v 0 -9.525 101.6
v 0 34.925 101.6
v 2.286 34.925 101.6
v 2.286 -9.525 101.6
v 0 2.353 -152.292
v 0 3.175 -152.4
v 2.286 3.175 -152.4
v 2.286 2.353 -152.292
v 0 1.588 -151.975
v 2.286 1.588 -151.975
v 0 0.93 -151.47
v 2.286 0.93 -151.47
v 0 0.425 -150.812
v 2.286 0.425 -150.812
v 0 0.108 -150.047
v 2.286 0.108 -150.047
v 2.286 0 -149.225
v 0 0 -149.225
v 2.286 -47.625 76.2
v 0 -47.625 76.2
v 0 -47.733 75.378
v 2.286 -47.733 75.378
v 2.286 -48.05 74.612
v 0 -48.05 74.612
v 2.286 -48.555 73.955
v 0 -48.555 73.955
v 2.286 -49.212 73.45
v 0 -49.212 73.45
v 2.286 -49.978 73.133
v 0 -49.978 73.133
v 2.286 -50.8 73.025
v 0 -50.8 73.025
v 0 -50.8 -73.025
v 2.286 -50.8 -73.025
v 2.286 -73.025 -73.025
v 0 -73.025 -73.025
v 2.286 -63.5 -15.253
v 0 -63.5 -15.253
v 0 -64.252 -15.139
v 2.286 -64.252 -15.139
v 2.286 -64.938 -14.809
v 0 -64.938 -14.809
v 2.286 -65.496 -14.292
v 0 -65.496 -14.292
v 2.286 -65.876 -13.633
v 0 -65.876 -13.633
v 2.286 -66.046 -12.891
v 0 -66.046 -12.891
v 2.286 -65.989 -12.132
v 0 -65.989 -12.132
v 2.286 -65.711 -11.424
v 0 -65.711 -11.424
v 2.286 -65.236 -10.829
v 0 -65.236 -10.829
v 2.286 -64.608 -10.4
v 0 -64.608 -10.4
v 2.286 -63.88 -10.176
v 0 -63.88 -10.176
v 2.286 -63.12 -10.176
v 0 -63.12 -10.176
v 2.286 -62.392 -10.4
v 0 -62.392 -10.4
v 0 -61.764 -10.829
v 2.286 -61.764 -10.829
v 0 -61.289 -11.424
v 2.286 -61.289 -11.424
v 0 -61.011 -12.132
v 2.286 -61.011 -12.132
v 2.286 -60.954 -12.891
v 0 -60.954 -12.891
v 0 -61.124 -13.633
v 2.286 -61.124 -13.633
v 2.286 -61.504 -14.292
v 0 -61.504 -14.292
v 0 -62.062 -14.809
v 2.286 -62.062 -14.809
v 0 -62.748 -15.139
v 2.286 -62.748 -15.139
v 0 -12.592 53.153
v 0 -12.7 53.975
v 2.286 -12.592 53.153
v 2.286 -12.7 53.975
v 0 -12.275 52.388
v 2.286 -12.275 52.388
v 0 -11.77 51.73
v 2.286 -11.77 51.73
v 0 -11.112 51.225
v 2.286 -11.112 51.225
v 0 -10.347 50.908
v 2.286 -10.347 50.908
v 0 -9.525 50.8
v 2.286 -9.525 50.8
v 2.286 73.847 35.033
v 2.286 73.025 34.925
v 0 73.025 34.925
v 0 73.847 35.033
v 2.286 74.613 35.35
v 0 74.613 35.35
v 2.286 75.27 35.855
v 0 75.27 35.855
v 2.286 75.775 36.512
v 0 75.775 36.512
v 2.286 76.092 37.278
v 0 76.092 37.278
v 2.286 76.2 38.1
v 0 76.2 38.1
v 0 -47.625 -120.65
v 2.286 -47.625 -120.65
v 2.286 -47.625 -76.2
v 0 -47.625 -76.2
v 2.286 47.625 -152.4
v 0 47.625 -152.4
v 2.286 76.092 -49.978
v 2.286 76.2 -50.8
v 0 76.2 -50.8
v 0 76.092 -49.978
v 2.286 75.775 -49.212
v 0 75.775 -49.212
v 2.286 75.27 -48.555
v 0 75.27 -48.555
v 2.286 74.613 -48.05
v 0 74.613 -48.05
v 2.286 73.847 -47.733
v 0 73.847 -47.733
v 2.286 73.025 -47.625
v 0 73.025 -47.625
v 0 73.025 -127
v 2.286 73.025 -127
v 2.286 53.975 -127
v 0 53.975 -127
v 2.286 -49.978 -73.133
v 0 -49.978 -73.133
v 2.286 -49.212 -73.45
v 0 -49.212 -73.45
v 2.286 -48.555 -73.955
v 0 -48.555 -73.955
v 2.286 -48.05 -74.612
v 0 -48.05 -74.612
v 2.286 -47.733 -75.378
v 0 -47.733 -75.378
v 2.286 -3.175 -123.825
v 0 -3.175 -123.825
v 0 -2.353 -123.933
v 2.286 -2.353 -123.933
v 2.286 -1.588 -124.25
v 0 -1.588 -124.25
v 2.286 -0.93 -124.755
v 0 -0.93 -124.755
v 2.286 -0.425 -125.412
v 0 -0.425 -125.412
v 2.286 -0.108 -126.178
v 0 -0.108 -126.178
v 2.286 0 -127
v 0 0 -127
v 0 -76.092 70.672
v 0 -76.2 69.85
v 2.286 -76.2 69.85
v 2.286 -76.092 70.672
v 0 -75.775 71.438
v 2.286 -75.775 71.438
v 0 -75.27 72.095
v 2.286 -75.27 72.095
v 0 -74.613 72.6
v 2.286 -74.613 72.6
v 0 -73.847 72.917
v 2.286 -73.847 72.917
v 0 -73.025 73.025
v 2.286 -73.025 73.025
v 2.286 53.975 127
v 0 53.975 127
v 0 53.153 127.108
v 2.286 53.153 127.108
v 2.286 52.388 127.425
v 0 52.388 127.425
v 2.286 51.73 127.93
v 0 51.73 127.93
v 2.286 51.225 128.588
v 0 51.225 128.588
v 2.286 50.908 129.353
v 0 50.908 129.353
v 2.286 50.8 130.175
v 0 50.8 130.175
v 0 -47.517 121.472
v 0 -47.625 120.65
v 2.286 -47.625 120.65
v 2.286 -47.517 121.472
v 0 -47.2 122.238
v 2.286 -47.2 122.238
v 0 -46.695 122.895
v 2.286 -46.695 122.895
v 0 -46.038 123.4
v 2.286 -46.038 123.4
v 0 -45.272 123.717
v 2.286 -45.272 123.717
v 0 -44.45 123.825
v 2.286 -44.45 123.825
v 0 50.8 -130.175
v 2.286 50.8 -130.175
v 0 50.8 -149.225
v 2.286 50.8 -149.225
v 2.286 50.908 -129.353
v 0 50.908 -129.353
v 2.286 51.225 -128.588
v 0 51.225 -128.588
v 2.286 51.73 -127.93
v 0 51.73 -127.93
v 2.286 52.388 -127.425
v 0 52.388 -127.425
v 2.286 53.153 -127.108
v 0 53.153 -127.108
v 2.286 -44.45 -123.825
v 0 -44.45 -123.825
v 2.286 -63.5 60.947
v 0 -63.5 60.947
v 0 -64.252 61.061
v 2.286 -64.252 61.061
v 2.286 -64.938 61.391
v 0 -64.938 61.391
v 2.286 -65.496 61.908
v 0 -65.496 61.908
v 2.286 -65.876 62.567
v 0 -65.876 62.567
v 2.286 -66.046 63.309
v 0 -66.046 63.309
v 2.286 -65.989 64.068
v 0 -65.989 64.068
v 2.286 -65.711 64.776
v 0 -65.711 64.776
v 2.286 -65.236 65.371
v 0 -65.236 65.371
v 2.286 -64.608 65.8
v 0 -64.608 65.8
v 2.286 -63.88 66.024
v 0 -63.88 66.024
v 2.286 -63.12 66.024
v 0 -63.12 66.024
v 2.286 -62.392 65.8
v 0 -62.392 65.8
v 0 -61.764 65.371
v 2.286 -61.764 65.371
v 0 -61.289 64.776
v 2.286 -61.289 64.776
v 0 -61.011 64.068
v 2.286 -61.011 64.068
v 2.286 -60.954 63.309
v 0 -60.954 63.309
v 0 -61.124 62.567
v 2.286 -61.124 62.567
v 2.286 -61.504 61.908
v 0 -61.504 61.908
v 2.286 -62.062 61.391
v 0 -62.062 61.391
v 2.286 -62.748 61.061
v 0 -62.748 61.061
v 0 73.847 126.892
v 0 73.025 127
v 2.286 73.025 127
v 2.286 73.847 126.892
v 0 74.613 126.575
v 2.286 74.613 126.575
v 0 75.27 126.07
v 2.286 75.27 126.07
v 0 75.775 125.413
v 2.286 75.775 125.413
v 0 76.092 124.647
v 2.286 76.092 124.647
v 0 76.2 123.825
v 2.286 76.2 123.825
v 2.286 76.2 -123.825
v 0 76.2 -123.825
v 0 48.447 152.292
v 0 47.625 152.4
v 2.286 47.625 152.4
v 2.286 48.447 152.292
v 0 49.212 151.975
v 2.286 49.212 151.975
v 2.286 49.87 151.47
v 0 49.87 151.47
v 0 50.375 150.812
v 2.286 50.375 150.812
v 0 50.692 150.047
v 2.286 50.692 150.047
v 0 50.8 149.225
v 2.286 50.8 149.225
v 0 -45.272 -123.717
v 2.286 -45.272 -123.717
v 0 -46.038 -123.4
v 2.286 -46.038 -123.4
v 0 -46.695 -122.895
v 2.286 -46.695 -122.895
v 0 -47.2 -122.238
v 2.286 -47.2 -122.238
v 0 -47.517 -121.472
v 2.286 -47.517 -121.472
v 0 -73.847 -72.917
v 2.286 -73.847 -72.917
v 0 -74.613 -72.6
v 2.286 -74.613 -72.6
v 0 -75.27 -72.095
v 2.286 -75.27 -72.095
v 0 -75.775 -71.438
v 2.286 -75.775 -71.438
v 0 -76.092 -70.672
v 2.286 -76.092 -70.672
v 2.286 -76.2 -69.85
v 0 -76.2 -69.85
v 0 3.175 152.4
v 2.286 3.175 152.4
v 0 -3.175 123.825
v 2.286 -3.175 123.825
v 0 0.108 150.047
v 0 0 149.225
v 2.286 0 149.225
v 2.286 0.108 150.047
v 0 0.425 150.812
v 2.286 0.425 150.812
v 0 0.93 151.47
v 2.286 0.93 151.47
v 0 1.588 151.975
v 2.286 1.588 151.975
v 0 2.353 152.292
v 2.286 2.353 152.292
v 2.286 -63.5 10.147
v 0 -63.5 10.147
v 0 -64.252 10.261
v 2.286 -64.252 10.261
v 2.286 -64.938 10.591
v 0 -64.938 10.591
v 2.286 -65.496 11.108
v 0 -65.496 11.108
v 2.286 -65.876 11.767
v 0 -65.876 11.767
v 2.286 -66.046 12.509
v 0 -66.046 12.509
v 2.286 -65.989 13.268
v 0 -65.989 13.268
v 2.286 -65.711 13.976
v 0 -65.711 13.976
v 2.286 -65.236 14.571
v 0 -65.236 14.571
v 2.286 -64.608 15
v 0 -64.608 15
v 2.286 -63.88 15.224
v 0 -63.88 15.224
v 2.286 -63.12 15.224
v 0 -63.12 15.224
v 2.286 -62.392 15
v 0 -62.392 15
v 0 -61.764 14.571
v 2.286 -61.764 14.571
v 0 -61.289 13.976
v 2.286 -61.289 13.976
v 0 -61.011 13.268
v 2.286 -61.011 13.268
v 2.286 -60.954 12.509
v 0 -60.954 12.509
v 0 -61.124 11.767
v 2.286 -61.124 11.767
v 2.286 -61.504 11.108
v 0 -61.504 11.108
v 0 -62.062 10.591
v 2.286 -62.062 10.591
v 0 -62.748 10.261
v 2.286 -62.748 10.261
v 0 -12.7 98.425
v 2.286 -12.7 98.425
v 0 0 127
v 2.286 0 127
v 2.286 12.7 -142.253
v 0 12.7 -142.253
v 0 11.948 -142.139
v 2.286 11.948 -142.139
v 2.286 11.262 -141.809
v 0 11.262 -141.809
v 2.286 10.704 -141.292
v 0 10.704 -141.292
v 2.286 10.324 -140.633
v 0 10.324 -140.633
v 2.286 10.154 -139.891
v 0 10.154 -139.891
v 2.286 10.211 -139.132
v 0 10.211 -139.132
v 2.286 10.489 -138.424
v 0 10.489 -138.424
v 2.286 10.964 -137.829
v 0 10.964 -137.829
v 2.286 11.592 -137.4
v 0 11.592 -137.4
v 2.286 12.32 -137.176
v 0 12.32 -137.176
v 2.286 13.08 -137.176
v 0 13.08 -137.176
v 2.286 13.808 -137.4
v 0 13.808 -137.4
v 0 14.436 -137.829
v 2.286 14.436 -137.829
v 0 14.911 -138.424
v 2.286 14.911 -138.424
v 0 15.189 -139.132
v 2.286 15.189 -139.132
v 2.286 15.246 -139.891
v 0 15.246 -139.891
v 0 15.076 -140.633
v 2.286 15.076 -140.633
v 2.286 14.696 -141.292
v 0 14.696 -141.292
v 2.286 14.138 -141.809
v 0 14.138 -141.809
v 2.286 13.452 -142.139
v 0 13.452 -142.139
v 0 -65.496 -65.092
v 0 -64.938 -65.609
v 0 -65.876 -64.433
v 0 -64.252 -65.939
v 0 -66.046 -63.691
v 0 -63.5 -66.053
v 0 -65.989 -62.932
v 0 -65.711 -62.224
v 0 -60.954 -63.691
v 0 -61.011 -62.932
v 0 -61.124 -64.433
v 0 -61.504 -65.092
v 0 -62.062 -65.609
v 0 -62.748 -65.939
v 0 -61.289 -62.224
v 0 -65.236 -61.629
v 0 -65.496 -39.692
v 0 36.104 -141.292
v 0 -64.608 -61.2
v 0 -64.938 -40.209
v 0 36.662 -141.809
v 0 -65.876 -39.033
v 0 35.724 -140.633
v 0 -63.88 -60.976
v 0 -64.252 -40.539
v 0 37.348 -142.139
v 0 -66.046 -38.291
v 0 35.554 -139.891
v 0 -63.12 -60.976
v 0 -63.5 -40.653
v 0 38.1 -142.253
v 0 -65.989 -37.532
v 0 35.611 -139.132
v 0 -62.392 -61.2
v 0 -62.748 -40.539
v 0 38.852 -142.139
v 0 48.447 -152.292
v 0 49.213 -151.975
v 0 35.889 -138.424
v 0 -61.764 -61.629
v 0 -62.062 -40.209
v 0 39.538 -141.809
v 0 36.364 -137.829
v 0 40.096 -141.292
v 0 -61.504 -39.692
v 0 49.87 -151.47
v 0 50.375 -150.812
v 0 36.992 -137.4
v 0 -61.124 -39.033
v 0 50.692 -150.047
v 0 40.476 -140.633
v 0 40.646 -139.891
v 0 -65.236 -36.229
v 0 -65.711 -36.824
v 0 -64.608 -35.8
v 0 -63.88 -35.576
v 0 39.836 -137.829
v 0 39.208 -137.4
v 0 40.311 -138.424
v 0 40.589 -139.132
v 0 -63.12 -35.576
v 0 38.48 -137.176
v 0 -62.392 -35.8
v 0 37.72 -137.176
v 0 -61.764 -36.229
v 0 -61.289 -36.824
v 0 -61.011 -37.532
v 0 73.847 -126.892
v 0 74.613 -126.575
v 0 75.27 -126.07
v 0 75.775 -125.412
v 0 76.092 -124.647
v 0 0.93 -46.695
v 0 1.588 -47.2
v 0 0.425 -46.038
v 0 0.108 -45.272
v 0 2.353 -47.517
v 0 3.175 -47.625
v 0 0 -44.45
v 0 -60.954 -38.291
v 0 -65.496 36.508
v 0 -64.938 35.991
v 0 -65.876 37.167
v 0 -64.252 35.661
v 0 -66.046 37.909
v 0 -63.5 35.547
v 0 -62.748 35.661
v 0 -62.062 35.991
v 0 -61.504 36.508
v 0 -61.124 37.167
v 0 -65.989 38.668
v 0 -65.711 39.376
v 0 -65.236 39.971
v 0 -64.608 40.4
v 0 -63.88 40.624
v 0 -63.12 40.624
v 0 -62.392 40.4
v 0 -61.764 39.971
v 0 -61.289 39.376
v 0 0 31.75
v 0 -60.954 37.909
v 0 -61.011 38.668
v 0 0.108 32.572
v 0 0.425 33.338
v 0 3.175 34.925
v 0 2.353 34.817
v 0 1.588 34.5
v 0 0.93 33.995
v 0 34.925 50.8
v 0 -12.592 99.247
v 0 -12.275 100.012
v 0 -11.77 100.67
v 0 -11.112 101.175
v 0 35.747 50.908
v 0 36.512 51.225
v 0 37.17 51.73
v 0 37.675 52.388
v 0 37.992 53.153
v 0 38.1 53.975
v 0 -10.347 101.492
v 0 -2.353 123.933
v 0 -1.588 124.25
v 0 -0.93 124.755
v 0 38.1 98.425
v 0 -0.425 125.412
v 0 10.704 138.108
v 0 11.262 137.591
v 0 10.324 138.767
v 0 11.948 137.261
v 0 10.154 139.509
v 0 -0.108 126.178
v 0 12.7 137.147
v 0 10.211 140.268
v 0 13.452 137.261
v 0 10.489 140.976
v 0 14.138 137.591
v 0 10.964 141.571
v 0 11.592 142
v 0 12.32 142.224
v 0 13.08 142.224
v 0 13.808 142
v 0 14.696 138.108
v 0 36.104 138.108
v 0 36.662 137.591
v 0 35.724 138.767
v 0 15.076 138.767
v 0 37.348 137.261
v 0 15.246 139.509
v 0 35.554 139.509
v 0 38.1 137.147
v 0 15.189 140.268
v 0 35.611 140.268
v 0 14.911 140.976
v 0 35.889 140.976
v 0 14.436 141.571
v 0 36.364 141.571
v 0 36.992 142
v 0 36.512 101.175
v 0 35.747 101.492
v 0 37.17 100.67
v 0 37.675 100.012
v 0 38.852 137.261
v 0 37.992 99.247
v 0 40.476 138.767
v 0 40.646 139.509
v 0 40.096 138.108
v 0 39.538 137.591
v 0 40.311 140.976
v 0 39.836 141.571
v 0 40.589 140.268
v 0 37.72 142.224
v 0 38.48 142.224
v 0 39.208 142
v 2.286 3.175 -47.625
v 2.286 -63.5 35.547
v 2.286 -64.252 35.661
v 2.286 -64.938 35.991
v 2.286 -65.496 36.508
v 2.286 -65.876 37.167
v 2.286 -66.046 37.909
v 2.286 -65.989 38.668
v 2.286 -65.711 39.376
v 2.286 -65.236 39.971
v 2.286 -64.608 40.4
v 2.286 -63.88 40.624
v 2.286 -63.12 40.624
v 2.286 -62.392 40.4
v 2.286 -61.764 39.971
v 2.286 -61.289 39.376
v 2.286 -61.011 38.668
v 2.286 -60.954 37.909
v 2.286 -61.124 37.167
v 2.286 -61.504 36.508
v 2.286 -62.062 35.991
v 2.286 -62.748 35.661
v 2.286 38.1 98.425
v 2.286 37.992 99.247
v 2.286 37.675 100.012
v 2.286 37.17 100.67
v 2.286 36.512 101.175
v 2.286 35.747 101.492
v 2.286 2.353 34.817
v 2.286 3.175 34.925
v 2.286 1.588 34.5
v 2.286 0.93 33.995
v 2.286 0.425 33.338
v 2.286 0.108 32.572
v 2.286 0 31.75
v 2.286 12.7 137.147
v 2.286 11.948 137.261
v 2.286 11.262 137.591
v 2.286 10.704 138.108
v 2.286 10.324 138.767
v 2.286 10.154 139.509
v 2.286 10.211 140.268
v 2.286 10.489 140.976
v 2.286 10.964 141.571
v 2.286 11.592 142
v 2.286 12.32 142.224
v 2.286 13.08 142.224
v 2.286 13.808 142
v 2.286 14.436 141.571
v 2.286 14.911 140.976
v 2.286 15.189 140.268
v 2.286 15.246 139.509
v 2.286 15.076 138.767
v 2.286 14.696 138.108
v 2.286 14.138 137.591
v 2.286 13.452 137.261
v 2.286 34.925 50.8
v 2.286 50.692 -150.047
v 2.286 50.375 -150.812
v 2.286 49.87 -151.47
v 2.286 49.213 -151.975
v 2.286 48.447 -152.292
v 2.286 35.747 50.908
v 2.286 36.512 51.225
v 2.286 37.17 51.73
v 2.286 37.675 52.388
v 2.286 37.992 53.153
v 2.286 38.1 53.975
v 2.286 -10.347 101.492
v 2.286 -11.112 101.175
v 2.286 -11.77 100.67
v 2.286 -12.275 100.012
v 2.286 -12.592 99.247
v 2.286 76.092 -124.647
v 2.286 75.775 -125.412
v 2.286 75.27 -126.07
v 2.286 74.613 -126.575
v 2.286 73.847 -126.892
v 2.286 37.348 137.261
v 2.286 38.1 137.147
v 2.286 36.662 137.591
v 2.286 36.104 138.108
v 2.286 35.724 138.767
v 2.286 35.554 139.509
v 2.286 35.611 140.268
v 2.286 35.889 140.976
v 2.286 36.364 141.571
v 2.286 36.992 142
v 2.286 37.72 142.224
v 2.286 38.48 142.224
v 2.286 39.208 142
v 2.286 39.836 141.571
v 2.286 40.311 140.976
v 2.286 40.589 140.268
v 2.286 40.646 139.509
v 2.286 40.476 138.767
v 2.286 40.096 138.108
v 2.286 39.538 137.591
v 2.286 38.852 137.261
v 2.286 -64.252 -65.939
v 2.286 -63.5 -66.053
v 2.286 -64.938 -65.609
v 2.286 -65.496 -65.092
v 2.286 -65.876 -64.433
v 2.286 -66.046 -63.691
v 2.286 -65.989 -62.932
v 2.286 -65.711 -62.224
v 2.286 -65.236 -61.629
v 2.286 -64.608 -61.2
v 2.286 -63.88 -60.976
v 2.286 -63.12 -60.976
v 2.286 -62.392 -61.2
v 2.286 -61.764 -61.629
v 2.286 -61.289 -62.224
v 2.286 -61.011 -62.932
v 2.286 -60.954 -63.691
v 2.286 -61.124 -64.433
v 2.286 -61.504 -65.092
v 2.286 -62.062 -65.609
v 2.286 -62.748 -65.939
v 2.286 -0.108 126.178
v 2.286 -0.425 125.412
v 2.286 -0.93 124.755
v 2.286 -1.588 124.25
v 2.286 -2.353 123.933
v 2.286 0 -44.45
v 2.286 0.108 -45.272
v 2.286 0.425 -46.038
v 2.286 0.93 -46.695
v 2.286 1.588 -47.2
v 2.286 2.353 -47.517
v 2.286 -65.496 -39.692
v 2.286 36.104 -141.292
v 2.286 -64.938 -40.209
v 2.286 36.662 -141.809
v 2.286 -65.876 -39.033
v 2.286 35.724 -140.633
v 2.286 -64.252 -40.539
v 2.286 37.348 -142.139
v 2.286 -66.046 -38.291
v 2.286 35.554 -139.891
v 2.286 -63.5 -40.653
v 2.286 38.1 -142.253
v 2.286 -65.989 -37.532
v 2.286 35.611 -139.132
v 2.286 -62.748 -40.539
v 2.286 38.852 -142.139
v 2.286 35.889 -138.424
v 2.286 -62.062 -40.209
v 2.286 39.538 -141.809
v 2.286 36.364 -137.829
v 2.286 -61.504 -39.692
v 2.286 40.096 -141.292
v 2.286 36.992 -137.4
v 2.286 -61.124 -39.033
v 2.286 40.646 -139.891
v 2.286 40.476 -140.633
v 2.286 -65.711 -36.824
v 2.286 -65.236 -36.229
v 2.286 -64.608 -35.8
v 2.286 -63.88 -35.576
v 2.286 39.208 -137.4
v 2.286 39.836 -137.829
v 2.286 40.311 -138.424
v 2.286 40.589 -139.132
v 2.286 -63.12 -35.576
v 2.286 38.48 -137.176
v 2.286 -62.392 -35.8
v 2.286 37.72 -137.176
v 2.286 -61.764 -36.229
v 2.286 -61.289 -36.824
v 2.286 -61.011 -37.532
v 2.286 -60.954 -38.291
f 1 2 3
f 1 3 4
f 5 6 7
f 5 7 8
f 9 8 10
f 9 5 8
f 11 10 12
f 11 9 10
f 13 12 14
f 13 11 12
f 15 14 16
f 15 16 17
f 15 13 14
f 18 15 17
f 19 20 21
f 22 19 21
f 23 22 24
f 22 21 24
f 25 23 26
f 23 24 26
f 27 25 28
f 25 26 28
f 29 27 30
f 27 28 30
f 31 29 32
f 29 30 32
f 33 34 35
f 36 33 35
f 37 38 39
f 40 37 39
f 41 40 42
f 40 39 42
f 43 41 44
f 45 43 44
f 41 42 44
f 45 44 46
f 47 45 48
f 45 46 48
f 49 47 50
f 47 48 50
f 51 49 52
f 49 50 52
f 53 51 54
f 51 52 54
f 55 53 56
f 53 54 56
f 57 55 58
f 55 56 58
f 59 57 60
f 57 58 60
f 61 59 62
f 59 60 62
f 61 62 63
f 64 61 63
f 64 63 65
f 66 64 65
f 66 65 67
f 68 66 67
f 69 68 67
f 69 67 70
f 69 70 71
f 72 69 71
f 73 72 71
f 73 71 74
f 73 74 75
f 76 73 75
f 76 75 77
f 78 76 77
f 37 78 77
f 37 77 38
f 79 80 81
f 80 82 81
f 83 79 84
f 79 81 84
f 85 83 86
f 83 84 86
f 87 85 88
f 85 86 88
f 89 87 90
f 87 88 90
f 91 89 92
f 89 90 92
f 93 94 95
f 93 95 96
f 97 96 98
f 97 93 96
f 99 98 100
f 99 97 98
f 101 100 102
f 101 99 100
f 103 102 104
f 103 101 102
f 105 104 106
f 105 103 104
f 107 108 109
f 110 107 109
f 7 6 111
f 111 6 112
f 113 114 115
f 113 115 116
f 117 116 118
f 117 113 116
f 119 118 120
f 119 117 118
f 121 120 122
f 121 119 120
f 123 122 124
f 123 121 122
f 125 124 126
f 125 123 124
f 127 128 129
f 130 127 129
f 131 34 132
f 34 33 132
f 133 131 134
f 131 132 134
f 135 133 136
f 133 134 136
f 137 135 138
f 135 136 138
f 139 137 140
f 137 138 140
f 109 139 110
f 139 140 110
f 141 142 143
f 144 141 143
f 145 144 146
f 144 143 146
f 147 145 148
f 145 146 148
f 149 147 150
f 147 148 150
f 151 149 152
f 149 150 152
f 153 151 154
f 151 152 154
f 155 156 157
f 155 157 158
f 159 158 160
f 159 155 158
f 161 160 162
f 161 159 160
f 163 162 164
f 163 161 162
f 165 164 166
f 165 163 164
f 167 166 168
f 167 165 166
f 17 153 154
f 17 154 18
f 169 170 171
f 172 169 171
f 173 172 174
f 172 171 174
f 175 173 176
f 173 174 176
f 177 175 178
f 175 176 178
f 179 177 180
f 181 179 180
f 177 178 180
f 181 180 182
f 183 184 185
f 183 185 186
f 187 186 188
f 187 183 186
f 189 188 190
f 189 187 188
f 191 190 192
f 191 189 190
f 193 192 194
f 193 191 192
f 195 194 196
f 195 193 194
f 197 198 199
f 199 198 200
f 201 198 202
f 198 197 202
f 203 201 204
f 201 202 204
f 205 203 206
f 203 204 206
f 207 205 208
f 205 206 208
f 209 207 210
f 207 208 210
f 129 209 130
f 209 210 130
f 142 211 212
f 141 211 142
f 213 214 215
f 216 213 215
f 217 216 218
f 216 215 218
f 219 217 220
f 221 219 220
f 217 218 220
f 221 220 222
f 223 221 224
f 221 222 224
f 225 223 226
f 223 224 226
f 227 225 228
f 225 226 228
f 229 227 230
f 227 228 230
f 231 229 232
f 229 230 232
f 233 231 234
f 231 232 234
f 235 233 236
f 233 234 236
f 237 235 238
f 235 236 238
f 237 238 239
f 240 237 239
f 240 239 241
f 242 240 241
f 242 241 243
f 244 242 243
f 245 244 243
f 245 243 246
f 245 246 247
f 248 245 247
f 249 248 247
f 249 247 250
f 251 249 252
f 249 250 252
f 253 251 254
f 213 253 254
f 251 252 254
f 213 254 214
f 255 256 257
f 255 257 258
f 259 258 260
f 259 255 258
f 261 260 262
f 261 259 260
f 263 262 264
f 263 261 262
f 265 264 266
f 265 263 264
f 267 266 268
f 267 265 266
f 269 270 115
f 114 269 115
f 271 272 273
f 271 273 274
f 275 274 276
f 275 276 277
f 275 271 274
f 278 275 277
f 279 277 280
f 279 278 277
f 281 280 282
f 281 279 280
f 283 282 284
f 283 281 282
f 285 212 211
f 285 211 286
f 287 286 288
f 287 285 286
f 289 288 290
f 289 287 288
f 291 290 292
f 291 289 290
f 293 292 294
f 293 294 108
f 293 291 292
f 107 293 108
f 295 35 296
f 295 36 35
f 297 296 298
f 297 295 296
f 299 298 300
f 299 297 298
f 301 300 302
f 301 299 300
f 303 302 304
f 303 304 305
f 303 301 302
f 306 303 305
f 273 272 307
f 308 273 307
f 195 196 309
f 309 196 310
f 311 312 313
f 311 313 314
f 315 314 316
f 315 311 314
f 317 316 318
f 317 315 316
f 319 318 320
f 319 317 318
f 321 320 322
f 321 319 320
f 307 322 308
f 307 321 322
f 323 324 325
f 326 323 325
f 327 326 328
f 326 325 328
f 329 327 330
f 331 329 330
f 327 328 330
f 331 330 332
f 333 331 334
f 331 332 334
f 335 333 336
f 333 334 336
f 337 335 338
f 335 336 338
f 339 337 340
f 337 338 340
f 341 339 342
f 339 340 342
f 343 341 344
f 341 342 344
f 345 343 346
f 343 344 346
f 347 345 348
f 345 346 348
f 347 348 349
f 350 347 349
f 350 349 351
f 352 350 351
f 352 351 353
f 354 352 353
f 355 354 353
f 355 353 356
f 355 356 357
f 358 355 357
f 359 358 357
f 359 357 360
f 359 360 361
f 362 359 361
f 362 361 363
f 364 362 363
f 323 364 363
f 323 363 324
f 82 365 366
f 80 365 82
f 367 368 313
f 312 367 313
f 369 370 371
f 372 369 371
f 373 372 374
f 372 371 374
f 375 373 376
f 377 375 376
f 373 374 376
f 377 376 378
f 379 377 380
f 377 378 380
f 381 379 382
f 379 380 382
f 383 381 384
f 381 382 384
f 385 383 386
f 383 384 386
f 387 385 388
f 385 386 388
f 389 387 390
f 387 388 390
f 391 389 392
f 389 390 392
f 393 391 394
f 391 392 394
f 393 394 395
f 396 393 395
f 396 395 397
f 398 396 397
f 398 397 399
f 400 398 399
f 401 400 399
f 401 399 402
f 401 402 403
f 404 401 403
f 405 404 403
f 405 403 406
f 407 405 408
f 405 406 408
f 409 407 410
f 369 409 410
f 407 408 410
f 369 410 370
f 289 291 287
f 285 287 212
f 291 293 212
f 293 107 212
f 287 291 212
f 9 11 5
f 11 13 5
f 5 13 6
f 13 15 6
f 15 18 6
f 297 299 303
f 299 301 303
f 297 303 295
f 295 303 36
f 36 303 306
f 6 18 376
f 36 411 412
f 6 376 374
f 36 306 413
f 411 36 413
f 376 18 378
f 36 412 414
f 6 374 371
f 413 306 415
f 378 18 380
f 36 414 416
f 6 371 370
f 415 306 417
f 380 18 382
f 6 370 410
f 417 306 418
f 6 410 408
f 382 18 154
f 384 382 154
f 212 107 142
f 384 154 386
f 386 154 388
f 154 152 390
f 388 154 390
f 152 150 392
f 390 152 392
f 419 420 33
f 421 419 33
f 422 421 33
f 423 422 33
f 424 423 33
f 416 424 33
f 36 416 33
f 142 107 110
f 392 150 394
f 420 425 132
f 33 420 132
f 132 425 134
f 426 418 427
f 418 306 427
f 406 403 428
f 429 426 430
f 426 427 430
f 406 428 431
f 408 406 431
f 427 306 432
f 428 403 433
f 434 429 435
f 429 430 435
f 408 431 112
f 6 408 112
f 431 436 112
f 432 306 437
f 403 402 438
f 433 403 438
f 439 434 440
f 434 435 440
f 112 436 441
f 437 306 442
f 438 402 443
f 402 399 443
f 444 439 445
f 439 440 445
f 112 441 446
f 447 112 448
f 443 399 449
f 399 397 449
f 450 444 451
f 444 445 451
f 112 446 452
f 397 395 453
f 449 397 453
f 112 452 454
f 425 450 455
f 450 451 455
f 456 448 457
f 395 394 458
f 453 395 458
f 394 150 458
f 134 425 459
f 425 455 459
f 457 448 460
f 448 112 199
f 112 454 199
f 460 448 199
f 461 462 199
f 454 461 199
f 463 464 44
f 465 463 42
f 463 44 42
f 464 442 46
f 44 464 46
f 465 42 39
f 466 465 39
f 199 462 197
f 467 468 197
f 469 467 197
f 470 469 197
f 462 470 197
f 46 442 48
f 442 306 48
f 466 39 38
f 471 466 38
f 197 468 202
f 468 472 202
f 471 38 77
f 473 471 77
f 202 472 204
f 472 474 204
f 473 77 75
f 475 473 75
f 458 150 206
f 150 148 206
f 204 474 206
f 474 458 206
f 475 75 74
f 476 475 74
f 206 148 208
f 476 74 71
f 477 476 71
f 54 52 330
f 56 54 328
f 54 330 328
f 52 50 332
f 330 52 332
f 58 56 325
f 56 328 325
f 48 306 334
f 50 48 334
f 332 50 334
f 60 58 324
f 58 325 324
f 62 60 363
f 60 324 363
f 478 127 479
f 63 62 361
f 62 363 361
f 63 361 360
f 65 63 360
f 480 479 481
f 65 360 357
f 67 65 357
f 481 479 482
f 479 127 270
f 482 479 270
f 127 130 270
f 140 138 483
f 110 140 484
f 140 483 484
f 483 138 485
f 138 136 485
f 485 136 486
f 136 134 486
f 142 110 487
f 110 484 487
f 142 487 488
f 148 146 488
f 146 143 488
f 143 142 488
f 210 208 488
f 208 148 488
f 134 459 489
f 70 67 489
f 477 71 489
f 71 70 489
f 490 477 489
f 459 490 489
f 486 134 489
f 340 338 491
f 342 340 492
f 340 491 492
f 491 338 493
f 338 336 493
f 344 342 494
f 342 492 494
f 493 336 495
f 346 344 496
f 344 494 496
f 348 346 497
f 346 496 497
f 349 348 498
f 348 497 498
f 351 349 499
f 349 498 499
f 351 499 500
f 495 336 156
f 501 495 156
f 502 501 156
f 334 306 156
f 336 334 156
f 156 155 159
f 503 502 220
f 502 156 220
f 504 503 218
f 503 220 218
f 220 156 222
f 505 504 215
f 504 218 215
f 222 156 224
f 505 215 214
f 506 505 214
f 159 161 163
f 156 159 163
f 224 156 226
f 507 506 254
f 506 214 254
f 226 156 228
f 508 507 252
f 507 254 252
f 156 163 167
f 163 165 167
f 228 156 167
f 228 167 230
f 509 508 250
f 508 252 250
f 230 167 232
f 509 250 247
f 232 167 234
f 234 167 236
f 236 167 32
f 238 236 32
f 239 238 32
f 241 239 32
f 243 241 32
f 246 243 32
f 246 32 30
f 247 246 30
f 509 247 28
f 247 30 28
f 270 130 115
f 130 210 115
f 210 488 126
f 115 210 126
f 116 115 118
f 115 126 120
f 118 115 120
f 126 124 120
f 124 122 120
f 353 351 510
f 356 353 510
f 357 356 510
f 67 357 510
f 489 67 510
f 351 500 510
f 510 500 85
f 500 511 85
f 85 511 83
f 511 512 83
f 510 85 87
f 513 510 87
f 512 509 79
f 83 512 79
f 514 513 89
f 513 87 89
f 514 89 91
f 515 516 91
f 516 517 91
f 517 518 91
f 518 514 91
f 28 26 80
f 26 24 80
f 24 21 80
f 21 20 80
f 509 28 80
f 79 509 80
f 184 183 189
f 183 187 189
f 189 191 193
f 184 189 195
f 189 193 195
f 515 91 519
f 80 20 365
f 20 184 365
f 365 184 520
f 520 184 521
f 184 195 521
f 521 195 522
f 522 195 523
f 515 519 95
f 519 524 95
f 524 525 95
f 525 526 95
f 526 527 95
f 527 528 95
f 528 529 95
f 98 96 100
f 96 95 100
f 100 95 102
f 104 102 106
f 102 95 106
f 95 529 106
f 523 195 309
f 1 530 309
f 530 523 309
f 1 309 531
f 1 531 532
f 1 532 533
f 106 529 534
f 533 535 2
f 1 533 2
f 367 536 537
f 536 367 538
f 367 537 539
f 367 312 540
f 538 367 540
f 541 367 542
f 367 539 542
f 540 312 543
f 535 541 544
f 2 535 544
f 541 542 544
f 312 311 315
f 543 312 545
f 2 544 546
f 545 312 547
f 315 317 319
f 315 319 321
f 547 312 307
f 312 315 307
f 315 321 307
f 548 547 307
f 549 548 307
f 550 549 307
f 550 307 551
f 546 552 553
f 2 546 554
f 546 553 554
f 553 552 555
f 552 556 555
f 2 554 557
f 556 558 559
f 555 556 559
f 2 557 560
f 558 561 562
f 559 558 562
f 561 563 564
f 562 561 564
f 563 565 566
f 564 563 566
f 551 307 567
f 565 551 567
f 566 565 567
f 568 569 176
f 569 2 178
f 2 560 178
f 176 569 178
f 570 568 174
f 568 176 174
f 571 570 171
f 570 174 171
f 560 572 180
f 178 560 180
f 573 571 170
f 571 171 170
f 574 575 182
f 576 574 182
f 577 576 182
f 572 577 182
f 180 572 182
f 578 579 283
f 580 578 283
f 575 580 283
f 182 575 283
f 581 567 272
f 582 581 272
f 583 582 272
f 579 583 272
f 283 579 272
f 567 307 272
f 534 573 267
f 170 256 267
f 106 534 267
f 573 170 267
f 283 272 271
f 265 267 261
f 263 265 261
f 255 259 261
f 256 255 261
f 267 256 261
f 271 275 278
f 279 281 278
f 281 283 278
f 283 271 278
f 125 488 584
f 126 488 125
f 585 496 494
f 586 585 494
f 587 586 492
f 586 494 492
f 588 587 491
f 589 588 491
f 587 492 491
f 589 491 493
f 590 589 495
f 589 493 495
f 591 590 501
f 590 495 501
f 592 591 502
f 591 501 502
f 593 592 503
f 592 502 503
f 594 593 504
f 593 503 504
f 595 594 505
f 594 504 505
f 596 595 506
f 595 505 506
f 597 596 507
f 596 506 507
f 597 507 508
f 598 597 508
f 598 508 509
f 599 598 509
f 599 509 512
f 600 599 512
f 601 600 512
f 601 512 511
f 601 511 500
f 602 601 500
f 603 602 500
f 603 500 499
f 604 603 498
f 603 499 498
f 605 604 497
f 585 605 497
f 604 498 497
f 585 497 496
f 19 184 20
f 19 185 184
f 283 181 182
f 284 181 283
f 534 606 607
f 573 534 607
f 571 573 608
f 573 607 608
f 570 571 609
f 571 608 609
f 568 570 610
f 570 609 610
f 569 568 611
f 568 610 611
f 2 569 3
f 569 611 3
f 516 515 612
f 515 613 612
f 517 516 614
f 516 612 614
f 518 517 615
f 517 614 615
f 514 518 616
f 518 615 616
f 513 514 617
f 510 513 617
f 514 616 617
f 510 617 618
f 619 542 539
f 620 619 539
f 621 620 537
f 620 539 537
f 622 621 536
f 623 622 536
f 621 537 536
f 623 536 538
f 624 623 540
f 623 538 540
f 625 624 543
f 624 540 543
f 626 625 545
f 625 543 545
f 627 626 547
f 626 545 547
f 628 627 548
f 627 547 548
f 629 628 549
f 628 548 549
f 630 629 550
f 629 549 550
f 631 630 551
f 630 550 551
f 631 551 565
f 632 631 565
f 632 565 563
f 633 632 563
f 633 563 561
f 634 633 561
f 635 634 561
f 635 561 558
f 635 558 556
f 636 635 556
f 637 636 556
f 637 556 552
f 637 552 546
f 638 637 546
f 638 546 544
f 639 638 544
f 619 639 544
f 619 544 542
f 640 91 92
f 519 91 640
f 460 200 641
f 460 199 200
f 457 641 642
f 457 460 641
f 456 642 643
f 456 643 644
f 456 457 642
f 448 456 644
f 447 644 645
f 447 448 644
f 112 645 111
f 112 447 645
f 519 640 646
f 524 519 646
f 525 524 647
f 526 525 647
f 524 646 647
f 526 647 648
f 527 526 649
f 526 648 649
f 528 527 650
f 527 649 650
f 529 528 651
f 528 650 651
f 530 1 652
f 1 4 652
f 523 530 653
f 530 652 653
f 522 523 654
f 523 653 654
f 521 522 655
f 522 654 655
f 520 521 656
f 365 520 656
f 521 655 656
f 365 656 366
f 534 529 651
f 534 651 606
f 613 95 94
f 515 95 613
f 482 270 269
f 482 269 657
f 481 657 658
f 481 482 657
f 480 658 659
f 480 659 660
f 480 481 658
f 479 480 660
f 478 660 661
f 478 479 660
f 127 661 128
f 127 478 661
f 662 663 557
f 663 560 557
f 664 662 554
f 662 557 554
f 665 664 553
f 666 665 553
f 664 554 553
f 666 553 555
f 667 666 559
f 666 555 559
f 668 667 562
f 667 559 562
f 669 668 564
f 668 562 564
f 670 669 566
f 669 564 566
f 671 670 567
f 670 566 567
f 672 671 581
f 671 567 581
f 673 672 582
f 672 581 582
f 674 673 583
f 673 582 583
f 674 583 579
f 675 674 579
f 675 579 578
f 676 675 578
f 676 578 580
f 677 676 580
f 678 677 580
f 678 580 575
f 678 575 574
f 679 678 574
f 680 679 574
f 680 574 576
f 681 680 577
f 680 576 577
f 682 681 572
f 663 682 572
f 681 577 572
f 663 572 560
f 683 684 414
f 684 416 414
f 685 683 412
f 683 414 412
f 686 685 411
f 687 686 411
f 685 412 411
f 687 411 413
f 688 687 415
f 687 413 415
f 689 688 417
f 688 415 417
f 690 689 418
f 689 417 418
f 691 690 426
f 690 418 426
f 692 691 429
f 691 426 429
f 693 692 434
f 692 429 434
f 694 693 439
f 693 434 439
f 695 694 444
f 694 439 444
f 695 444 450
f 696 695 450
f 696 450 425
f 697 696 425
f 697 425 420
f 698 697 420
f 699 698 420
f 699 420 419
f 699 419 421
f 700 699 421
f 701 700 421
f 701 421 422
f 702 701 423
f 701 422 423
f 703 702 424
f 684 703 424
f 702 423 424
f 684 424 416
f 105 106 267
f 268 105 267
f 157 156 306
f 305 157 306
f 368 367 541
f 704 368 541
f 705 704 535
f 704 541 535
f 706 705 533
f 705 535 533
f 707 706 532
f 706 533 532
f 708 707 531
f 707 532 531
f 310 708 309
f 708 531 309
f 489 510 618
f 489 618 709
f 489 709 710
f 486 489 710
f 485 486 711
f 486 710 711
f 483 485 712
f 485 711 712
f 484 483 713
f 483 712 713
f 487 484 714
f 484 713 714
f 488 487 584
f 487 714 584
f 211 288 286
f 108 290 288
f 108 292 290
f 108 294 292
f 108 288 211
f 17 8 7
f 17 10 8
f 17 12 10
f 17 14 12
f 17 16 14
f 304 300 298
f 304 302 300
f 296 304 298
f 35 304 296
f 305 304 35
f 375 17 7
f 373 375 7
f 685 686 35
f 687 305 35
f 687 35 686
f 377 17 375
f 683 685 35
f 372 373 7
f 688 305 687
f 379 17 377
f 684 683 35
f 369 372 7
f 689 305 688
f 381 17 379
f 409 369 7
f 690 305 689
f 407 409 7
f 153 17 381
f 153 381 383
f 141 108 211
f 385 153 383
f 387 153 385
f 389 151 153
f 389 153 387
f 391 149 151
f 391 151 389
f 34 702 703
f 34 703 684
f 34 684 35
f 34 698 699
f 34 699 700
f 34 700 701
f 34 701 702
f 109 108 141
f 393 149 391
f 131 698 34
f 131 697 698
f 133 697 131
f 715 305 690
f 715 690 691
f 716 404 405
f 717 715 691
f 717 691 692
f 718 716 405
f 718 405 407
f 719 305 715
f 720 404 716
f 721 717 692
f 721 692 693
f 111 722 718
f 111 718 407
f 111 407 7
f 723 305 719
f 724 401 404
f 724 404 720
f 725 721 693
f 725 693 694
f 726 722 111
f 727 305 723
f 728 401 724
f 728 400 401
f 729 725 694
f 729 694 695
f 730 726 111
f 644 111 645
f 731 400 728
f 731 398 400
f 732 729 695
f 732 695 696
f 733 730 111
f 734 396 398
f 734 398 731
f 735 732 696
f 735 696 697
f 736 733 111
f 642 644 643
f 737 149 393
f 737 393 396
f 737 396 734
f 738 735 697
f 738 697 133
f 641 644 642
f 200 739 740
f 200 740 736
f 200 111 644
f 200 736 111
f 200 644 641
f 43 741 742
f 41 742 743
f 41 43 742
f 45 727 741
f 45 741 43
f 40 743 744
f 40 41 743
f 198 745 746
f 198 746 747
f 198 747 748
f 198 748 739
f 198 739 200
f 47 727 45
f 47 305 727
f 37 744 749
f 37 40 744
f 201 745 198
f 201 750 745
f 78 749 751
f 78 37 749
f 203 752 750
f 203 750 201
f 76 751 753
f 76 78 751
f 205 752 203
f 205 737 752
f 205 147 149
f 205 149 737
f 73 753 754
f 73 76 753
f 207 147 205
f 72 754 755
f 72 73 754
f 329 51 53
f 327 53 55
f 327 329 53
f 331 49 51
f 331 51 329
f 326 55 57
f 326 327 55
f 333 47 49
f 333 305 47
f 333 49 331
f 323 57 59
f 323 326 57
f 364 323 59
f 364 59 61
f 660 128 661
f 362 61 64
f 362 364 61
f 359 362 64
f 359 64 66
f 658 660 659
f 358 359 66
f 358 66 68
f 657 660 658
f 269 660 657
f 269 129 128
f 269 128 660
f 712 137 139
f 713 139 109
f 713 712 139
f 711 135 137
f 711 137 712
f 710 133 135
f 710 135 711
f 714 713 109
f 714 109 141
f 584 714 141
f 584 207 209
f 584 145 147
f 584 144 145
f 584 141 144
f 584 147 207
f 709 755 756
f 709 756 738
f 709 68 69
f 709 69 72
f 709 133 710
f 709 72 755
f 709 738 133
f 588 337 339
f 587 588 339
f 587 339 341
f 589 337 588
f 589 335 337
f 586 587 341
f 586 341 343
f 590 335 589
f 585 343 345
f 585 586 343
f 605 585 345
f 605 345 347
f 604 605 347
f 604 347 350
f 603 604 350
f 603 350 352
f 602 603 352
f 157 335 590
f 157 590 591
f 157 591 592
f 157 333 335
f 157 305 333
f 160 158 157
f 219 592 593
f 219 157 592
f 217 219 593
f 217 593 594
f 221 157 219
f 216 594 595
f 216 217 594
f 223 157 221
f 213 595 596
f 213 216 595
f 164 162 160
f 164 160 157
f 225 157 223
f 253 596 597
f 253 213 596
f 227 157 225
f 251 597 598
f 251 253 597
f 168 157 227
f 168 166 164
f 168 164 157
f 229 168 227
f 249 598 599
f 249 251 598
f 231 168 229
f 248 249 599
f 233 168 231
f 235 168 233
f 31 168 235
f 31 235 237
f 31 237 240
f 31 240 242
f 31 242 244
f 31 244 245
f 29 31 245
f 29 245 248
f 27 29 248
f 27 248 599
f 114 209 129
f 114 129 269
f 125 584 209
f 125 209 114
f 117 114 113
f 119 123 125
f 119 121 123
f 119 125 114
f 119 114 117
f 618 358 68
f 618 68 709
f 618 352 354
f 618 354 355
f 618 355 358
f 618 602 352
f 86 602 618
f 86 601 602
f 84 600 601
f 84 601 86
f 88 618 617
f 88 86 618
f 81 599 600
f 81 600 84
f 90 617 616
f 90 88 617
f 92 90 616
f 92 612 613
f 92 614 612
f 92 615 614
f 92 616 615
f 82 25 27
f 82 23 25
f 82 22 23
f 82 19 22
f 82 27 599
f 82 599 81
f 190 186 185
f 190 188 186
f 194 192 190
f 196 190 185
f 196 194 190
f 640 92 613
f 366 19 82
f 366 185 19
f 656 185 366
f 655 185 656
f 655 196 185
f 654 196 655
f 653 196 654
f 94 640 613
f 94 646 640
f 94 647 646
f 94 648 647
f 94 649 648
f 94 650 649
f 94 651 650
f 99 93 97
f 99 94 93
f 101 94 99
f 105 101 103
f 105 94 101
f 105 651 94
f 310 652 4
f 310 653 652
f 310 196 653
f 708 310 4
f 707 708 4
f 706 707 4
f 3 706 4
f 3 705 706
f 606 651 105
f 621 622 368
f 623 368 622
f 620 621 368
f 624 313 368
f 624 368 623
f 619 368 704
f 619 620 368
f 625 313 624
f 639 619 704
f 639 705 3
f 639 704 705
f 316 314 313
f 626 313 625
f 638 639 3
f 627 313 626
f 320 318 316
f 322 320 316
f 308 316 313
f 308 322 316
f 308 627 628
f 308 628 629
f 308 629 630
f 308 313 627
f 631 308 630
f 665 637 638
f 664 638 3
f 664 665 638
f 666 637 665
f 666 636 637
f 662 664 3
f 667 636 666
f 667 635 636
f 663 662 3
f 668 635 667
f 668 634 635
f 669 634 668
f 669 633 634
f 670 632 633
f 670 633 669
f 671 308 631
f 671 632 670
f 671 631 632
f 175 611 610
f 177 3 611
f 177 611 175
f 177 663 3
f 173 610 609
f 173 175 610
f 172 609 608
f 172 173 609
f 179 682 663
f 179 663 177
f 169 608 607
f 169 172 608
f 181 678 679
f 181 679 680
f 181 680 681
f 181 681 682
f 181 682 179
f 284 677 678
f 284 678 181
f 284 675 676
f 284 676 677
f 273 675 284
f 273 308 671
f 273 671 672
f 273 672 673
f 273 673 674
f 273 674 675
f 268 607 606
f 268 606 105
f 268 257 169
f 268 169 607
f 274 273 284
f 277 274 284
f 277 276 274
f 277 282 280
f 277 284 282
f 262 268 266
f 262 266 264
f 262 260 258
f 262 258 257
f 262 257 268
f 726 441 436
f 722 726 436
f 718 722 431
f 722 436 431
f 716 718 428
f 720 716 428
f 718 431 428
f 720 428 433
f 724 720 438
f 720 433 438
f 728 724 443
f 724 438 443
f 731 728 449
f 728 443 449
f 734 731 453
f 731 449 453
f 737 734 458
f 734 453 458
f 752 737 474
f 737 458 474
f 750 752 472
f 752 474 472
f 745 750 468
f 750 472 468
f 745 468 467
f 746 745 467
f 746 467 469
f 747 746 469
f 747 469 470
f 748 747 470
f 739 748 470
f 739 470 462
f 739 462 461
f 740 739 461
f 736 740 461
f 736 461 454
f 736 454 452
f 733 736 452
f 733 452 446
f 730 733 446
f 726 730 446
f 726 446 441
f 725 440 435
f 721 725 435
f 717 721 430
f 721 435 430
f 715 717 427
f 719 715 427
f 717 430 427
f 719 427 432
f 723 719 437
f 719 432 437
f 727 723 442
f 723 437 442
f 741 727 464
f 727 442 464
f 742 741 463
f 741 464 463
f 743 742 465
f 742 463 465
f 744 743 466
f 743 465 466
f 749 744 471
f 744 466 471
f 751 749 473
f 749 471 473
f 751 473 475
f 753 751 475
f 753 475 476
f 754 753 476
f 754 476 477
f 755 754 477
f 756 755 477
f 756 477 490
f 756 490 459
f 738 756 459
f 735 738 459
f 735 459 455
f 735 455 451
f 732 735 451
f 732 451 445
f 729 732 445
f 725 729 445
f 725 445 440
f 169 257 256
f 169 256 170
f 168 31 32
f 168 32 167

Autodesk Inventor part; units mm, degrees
ref_plane "YZ Plane" through (0, 0, 0) normal (1, 0, 0) x (0, 1, 0)
ref_plane "XZ Plane" through (0, 0, 0) normal (0, 1, 0) x (-1, 0, 0)
ref_plane "XY Plane" through (0, 0, 0) normal (0, 0, 1) x (1, 0, 0)
sketch "Sketch1" plane through (0, 0, 0) normal (1, 0, 0) x (0, 1, 0)
  line L0 (76.2, 152.4) -> (-76.2, 152.4)
  line L1 (-76.2, 152.4) -> (-76.2, -152.4)
  line L2 (-76.2, -152.4) -> (76.2, -152.4)
  line L3 (76.2, -152.4) -> (76.2, 152.4)
  line L4 (76.2, 152.4) -> (-76.2, -152.4) construction
  line L5 (-76.2, 152.4) -> (76.2, -152.4) construction
  line L6 (38.1, 101.6) -> (-12.7, 101.6)
  line L7 (-12.7, 101.6) -> (-12.7, 50.8)
  line L8 (-12.7, 50.8) -> (38.1, 50.8)
  line L9 (38.1, 50.8) -> (38.1, 101.6)
  line L10 (38.1, 101.6) -> (-12.7, 50.8) construction
  line L11 (-12.7, 101.6) -> (38.1, 50.8) construction
  line L12 (76.2, 34.925) -> (0, 34.925)
  line L13 (0, 34.925) -> (0, -47.625)
  line L14 (0, -47.625) -> (76.2, -47.625)
  line L15 (76.2, -47.625) -> (76.2, 34.925)
  line L16 (76.2, 34.925) -> (0, -47.625) construction
  line L17 (0, 34.925) -> (76.2, -47.625) construction
  point P0 (0, 0)
  point P1 (12.7, 76.2)
  point P2 (38.1, -6.35)
  point P3 (76.2, -6.35)
  point P4 (76.2, 0)
  point P5 (76.2, -47.625)
  point P6 (0, 44.45)
  point P7 (31.75, 44.45)
  point P8 (76.2, 34.925)
  dimension "d0" = 152.4
  dimension "d1" = 304.8
  dimension "d2" = 50.8
  dimension "d3" = 88.9
  dimension "d4" = 76.2
  dimension "d39" = 76.2
  dimension "d40" = 82.55
  dimension "d41" = 146.05
extrude "Extrusion1" add sketch "Sketch1" along normal blind 2.286 contours L3 L12 L13 L14 L2 L1 L0
fillet "Fillet1" radius 3.175 8 edges at (1.143, 38.1, 50.8) (1.143, 38.1, 101.6) (1.143, -12.7, 101.6) (1.143, -12.7, 50.8) (1.143, 76.2, 152.4) (1.143, 76.2, -152.4) (1.143, -76.2, -152.4) (1.143, -76.2, 152.4)
sketch "Sketch2" plane through (2.286, 0, 0) normal (1, 0, 0) x (0, 0, -1)
  arc A0 (-152.4, -73.025) -> (-149.225, -76.2) centre (-149.225, -73.025) ccw construction
  line L0 (-152.4, -73.025) -> (-152.4, 73.025) construction
  arc A1 (-149.225, 76.2) -> (-152.4, 73.025) centre (-149.225, 73.025) ccw construction
  line L1 (-149.225, 76.2) -> (-34.925, 76.2) construction
  arc A2 (152.4, 73.025) -> (149.225, 76.2) centre (149.225, 73.025) ccw construction
  line L2 (152.4, 73.025) -> (152.4, -73.025) construction
  arc A3 (149.225, -76.2) -> (152.4, -73.025) centre (149.225, -73.025) ccw construction
  line L3 (149.225, -76.2) -> (-149.225, -76.2) construction
  line L4 (-34.925, 76.2) -> (-34.925, 0) projected
  line L5 (-34.925, 0) -> (47.625, 0) projected
  line L6 (47.625, 0) -> (47.625, 76.2) projected
  line L7 (47.625, 76.2) -> (149.225, 76.2) projected
  arc A4 (-53.975, -12.7) -> (-50.8, -9.525) centre (-53.975, -9.525) ccw projected
  line L8 (-50.8, -9.525) -> (-50.8, 34.925) projected
  arc A5 (-50.8, 34.925) -> (-53.975, 38.1) centre (-53.975, 34.925) ccw projected
  line L9 (-53.975, 38.1) -> (-98.425, 38.1) projected
  arc A6 (-98.425, 38.1) -> (-101.6, 34.925) centre (-98.425, 34.925) ccw projected
  line L10 (-101.6, 34.925) -> (-101.6, -9.525) projected
  arc A7 (-101.6, -9.525) -> (-98.425, -12.7) centre (-98.425, -9.525) ccw projected
  line L11 (-98.425, -12.7) -> (-53.975, -12.7) projected
  point P0 (0, 0)
  point P1 (-139.7, -63.5)
  point P2 (139.7, -63.5)
  point P3 (-139.7, -38.1)
  point P4 (139.7, -38.1)
  point P5 (-139.7, -12.7)
  point P6 (139.7, -12.7)
  point P7 (-139.7, 12.7)
  point P8 (139.7, 12.7)
  point P9 (-139.7, 38.1)
  point P10 (139.7, 38.1)
  point P11 (-139.7, 63.5)
  point P12 (139.7, 63.5)
  point P13 (-114.3, -63.5)
  point P14 (-88.9, -63.5)
  point P15 (-63.5, -63.5)
  point P16 (-38.1, -63.5)
  point P17 (-12.7, -63.5)
  point P18 (12.7, -63.5)
  point P19 (38.1, -63.5)
  point P20 (63.5, -63.5)
  point P21 (88.9, -63.5)
  point P22 (114.3, -63.5)
  point P23 (139.7, -63.5)
  dimension "d8" = 12.7
  dimension "d9" = 12.7
  dimension "d10" = 12.7
  dimension "d13" = 25.4
  dimension "d34" = 25.4
hole "Hole1" at (2.286, -63.5, 139.7) at (2.286, -63.5, -139.7) at (2.286, -38.1, 139.7) at (2.286, -38.1, -139.7) at (2.286, -12.7, 139.7) at (2.286, -12.7, -139.7) at (2.286, 12.7, 139.7) at (2.286, 12.7, -139.7) at (2.286, 38.1, 139.7) at (2.286, 38.1, -139.7) at (2.286, 63.5, 139.7) at (2.286, 63.5, -139.7) at (2.286, -63.5, 88.9) at (2.286, -63.5, 63.5) at (2.286, -63.5, 38.1) at (2.286, -63.5, 12.7) at (2.286, -63.5, -12.7) at (2.286, -63.5, -38.1) at (2.286, -63.5, -63.5) at (2.286, -63.5, -88.9) direction (-1, 0, 0) diameter 5.1054 end through all clearance for "Flat Head Machine Screw (82)" size "#10" standard "Ansi Unified Screw Threads"
sketch "Sketch3" plane through (2.286, 0, 0) normal (1, 0, 0) x (0, 0, -1)
  line L0 (-123.825, 0) -> (-152.4, 0)
  line L1 (-152.4, 0) -> (-152.4, -76.2)
  line L2 (-152.4, -76.2) -> (-123.825, -76.2)
  line L3 (-123.825, -76.2) -> (-123.825, 0)
  line L4 (-123.825, 0) -> (-152.4, -76.2) construction
  line L5 (-152.4, 0) -> (-123.825, -76.2) construction
  circle A0 centre (-139.7, 63.5) radius 2.5527 construction
  circle A1 centre (-139.7, 38.1) radius 2.5527 construction
  circle A2 centre (-139.7, 12.7) radius 2.5527 construction
  circle A3 centre (-139.7, -12.7) radius 2.5527 construction
  circle A4 centre (-139.7, -38.1) radius 2.5527 construction
  circle A5 centre (-139.7, -63.5) radius 2.5527 construction
  circle A6 centre (139.7, -63.5) radius 2.5527 construction
  circle A7 centre (139.7, -38.1) radius 2.5527 construction
  circle A8 centre (139.7, -12.7) radius 2.5527 construction
  circle A9 centre (139.7, 12.7) radius 2.5527 construction
  circle A10 centre (139.7, 38.1) radius 2.5527 construction
  circle A11 centre (139.7, 63.5) radius 2.5527 construction
  arc A12 (-152.4, -73.025) -> (-149.225, -76.2) centre (-149.225, -73.025) ccw construction
  line L6 (-152.4, -73.025) -> (-152.4, 73.025) construction
  arc A13 (-149.225, 76.2) -> (-152.4, 73.025) centre (-149.225, 73.025) ccw construction
  line L7 (-149.225, 76.2) -> (-34.925, 76.2) construction
  arc A14 (152.4, 73.025) -> (149.225, 76.2) centre (149.225, 73.025) ccw construction
  line L8 (152.4, 73.025) -> (152.4, -73.025) construction
  arc A15 (149.225, -76.2) -> (152.4, -73.025) centre (149.225, -73.025) ccw construction
  line L9 (149.225, -76.2) -> (-149.225, -76.2) construction
  line L10 (-149.225, -76.2) -> (149.225, -76.2) construction
  line L11 (149.225, 76.2) -> (-149.225, 76.2) construction
  line L12 (0, 76.2) -> (0, -76.2) construction
  line L13 (-149.225, -76.2) -> (149.225, -76.2) construction
  line L14 (-152.4, -47.625) -> (-73.025, -47.625)
  line L15 (-73.025, -47.625) -> (-73.025, -76.2)
  line L16 (-73.025, -76.2) -> (-152.4, -76.2)
  line L17 (-152.4, -76.2) -> (-152.4, -47.625)
  line L18 (-152.4, -47.625) -> (-73.025, -76.2) construction
  line L19 (-73.025, -47.625) -> (-152.4, -76.2) construction
  line L20 (123.825, 0) -> (152.4, 0)
  line L21 (152.4, 0) -> (152.4, -76.2)
  line L22 (152.4, -76.2) -> (123.825, -76.2)
  line L23 (123.825, -76.2) -> (123.825, 0)
  line L24 (123.825, 0) -> (152.4, -76.2) construction
  line L25 (152.4, 0) -> (123.825, -76.2) construction
  circle A16 centre (139.7, -12.7) radius 2.5527 construction
  circle A17 centre (139.7, -38.1) radius 2.5527 construction
  circle A18 centre (139.7, -63.5) radius 2.5527 construction
  arc A19 (149.225, -76.2) -> (152.4, -73.025) centre (149.225, -73.025) ccw construction
  arc A20 (98.425, -25.4) -> (101.6, -22.225) centre (98.425, -22.225) ccw construction
  line L26 (152.4, -47.625) -> (73.025, -47.625)
  line L27 (73.025, -47.625) -> (73.025, -76.2)
  line L28 (73.025, -76.2) -> (152.4, -76.2)
  line L29 (152.4, -76.2) -> (152.4, -47.625)
  line L30 (152.4, -47.625) -> (73.025, -76.2) construction
  line L31 (73.025, -47.625) -> (152.4, -76.2) construction
  circle A21 centre (63.5, -63.5) radius 2.5527 projected
  circle A22 centre (12.7, -63.5) radius 2.5527 projected
  circle A23 centre (-38.1, -63.5) radius 2.5527 projected
  circle A24 centre (-88.9, -63.5) radius 2.5527 projected
  circle A25 centre (-63.5, -63.5) radius 2.5527 projected
  circle A26 centre (-12.7, -63.5) radius 2.5527 projected
  circle A27 centre (38.1, -63.5) radius 2.5527 projected
  circle A28 centre (88.9, -63.5) radius 2.5527 projected
  line L32 (-34.925, 76.2) -> (-34.925, 0) projected
  line L33 (-34.925, 0) -> (47.625, 0) projected
  line L34 (47.625, 0) -> (47.625, 76.2) projected
  line L35 (47.625, 76.2) -> (149.225, 76.2) projected
  arc A29 (-53.975, -12.7) -> (-50.8, -9.525) centre (-53.975, -9.525) ccw projected
  line L36 (-50.8, -9.525) -> (-50.8, 34.925) projected
  arc A30 (-50.8, 34.925) -> (-53.975, 38.1) centre (-53.975, 34.925) ccw projected
  line L37 (-53.975, 38.1) -> (-98.425, 38.1) projected
  arc A31 (-98.425, 38.1) -> (-101.6, 34.925) centre (-98.425, 34.925) ccw projected
  line L38 (-101.6, 34.925) -> (-101.6, -9.525) projected
  arc A32 (-101.6, -9.525) -> (-98.425, -12.7) centre (-98.425, -9.525) ccw projected
  line L39 (-98.425, -12.7) -> (-53.975, -12.7) projected
  line L40 (-127, 50.8) -> (-152.4, 50.8)
  line L41 (-152.4, 50.8) -> (-152.4, 76.2)
  line L42 (-152.4, 76.2) -> (-127, 76.2)
  line L43 (-127, 76.2) -> (-127, 50.8)
  circle A33 centre (139.7, 63.5) radius 2.5527 construction
  arc A34 (152.4, 73.025) -> (149.225, 76.2) centre (149.225, 73.025) ccw construction
  line L44 (127, 50.8) -> (152.4, 50.8)
  line L45 (152.4, 50.8) -> (152.4, 76.2)
  line L46 (152.4, 76.2) -> (127, 76.2)
  line L47 (127, 76.2) -> (127, 50.8)
  point P0 (0, 0)
  point P1 (-138.1125, -38.1)
  point P2 (-101.6, -22.225)
  point P3 (-98.425, -25.4)
  point P4 (-98.425, -22.225)
  point P5 (-112.7125, -61.9125)
  point P6 (138.1125, -38.1)
  point P7 (112.7125, -61.9125)
  point P8 (123.825, -47.625)
  point P9 (-123.825, -47.625)
  dimension "d25" = 28.575
  dimension "d26" = 76.2
  dimension "d27" = 28.575
  dimension "d28" = 79.375
  dimension "d42" = 25.4
extrude "Extrusion2" cut sketch "Sketch3" against normal through all contours L3 L14 L1 L0 | L14 L15 L16 L3 | L3 L2 L1 L14 | L20 L21 L26 L23 | L26 L21 L22 L23 | L23 L28 L27 L26 | A24 | A28 | L35 L46 L45 L44 L47 | L40 L41 L42 L43
fillet "Fillet2" radius 3.175 20 edges at (1.143, 0, 152.4) (1.143, 0, 123.825) (1.143, -47.625, 123.825) (1.143, -47.625, 73.025) (1.143, -76.2, 73.025) (1.143, -76.2, -73.025) (1.143, -47.625, -73.025) (1.143, -47.625, -123.825) (1.143, 0, -123.825) (1.143, 0, -152.4) (1.143, 0, 34.925) (1.143, 0, -47.625) (1.143, 76.2, -47.625) (1.143, 76.2, 34.925) (1.143, 50.8, 127) (1.143, 76.2, 127) (1.143, 50.8, 152.4) (1.143, 76.2, -127) (1.143, 50.8, -127) (1.143, 50.8, -152.4)
equation "\"d9\" = d8"
equation "\"d10\" = d8"
properties part number "DB1-025" material "Polycarbonate, Smoke"
